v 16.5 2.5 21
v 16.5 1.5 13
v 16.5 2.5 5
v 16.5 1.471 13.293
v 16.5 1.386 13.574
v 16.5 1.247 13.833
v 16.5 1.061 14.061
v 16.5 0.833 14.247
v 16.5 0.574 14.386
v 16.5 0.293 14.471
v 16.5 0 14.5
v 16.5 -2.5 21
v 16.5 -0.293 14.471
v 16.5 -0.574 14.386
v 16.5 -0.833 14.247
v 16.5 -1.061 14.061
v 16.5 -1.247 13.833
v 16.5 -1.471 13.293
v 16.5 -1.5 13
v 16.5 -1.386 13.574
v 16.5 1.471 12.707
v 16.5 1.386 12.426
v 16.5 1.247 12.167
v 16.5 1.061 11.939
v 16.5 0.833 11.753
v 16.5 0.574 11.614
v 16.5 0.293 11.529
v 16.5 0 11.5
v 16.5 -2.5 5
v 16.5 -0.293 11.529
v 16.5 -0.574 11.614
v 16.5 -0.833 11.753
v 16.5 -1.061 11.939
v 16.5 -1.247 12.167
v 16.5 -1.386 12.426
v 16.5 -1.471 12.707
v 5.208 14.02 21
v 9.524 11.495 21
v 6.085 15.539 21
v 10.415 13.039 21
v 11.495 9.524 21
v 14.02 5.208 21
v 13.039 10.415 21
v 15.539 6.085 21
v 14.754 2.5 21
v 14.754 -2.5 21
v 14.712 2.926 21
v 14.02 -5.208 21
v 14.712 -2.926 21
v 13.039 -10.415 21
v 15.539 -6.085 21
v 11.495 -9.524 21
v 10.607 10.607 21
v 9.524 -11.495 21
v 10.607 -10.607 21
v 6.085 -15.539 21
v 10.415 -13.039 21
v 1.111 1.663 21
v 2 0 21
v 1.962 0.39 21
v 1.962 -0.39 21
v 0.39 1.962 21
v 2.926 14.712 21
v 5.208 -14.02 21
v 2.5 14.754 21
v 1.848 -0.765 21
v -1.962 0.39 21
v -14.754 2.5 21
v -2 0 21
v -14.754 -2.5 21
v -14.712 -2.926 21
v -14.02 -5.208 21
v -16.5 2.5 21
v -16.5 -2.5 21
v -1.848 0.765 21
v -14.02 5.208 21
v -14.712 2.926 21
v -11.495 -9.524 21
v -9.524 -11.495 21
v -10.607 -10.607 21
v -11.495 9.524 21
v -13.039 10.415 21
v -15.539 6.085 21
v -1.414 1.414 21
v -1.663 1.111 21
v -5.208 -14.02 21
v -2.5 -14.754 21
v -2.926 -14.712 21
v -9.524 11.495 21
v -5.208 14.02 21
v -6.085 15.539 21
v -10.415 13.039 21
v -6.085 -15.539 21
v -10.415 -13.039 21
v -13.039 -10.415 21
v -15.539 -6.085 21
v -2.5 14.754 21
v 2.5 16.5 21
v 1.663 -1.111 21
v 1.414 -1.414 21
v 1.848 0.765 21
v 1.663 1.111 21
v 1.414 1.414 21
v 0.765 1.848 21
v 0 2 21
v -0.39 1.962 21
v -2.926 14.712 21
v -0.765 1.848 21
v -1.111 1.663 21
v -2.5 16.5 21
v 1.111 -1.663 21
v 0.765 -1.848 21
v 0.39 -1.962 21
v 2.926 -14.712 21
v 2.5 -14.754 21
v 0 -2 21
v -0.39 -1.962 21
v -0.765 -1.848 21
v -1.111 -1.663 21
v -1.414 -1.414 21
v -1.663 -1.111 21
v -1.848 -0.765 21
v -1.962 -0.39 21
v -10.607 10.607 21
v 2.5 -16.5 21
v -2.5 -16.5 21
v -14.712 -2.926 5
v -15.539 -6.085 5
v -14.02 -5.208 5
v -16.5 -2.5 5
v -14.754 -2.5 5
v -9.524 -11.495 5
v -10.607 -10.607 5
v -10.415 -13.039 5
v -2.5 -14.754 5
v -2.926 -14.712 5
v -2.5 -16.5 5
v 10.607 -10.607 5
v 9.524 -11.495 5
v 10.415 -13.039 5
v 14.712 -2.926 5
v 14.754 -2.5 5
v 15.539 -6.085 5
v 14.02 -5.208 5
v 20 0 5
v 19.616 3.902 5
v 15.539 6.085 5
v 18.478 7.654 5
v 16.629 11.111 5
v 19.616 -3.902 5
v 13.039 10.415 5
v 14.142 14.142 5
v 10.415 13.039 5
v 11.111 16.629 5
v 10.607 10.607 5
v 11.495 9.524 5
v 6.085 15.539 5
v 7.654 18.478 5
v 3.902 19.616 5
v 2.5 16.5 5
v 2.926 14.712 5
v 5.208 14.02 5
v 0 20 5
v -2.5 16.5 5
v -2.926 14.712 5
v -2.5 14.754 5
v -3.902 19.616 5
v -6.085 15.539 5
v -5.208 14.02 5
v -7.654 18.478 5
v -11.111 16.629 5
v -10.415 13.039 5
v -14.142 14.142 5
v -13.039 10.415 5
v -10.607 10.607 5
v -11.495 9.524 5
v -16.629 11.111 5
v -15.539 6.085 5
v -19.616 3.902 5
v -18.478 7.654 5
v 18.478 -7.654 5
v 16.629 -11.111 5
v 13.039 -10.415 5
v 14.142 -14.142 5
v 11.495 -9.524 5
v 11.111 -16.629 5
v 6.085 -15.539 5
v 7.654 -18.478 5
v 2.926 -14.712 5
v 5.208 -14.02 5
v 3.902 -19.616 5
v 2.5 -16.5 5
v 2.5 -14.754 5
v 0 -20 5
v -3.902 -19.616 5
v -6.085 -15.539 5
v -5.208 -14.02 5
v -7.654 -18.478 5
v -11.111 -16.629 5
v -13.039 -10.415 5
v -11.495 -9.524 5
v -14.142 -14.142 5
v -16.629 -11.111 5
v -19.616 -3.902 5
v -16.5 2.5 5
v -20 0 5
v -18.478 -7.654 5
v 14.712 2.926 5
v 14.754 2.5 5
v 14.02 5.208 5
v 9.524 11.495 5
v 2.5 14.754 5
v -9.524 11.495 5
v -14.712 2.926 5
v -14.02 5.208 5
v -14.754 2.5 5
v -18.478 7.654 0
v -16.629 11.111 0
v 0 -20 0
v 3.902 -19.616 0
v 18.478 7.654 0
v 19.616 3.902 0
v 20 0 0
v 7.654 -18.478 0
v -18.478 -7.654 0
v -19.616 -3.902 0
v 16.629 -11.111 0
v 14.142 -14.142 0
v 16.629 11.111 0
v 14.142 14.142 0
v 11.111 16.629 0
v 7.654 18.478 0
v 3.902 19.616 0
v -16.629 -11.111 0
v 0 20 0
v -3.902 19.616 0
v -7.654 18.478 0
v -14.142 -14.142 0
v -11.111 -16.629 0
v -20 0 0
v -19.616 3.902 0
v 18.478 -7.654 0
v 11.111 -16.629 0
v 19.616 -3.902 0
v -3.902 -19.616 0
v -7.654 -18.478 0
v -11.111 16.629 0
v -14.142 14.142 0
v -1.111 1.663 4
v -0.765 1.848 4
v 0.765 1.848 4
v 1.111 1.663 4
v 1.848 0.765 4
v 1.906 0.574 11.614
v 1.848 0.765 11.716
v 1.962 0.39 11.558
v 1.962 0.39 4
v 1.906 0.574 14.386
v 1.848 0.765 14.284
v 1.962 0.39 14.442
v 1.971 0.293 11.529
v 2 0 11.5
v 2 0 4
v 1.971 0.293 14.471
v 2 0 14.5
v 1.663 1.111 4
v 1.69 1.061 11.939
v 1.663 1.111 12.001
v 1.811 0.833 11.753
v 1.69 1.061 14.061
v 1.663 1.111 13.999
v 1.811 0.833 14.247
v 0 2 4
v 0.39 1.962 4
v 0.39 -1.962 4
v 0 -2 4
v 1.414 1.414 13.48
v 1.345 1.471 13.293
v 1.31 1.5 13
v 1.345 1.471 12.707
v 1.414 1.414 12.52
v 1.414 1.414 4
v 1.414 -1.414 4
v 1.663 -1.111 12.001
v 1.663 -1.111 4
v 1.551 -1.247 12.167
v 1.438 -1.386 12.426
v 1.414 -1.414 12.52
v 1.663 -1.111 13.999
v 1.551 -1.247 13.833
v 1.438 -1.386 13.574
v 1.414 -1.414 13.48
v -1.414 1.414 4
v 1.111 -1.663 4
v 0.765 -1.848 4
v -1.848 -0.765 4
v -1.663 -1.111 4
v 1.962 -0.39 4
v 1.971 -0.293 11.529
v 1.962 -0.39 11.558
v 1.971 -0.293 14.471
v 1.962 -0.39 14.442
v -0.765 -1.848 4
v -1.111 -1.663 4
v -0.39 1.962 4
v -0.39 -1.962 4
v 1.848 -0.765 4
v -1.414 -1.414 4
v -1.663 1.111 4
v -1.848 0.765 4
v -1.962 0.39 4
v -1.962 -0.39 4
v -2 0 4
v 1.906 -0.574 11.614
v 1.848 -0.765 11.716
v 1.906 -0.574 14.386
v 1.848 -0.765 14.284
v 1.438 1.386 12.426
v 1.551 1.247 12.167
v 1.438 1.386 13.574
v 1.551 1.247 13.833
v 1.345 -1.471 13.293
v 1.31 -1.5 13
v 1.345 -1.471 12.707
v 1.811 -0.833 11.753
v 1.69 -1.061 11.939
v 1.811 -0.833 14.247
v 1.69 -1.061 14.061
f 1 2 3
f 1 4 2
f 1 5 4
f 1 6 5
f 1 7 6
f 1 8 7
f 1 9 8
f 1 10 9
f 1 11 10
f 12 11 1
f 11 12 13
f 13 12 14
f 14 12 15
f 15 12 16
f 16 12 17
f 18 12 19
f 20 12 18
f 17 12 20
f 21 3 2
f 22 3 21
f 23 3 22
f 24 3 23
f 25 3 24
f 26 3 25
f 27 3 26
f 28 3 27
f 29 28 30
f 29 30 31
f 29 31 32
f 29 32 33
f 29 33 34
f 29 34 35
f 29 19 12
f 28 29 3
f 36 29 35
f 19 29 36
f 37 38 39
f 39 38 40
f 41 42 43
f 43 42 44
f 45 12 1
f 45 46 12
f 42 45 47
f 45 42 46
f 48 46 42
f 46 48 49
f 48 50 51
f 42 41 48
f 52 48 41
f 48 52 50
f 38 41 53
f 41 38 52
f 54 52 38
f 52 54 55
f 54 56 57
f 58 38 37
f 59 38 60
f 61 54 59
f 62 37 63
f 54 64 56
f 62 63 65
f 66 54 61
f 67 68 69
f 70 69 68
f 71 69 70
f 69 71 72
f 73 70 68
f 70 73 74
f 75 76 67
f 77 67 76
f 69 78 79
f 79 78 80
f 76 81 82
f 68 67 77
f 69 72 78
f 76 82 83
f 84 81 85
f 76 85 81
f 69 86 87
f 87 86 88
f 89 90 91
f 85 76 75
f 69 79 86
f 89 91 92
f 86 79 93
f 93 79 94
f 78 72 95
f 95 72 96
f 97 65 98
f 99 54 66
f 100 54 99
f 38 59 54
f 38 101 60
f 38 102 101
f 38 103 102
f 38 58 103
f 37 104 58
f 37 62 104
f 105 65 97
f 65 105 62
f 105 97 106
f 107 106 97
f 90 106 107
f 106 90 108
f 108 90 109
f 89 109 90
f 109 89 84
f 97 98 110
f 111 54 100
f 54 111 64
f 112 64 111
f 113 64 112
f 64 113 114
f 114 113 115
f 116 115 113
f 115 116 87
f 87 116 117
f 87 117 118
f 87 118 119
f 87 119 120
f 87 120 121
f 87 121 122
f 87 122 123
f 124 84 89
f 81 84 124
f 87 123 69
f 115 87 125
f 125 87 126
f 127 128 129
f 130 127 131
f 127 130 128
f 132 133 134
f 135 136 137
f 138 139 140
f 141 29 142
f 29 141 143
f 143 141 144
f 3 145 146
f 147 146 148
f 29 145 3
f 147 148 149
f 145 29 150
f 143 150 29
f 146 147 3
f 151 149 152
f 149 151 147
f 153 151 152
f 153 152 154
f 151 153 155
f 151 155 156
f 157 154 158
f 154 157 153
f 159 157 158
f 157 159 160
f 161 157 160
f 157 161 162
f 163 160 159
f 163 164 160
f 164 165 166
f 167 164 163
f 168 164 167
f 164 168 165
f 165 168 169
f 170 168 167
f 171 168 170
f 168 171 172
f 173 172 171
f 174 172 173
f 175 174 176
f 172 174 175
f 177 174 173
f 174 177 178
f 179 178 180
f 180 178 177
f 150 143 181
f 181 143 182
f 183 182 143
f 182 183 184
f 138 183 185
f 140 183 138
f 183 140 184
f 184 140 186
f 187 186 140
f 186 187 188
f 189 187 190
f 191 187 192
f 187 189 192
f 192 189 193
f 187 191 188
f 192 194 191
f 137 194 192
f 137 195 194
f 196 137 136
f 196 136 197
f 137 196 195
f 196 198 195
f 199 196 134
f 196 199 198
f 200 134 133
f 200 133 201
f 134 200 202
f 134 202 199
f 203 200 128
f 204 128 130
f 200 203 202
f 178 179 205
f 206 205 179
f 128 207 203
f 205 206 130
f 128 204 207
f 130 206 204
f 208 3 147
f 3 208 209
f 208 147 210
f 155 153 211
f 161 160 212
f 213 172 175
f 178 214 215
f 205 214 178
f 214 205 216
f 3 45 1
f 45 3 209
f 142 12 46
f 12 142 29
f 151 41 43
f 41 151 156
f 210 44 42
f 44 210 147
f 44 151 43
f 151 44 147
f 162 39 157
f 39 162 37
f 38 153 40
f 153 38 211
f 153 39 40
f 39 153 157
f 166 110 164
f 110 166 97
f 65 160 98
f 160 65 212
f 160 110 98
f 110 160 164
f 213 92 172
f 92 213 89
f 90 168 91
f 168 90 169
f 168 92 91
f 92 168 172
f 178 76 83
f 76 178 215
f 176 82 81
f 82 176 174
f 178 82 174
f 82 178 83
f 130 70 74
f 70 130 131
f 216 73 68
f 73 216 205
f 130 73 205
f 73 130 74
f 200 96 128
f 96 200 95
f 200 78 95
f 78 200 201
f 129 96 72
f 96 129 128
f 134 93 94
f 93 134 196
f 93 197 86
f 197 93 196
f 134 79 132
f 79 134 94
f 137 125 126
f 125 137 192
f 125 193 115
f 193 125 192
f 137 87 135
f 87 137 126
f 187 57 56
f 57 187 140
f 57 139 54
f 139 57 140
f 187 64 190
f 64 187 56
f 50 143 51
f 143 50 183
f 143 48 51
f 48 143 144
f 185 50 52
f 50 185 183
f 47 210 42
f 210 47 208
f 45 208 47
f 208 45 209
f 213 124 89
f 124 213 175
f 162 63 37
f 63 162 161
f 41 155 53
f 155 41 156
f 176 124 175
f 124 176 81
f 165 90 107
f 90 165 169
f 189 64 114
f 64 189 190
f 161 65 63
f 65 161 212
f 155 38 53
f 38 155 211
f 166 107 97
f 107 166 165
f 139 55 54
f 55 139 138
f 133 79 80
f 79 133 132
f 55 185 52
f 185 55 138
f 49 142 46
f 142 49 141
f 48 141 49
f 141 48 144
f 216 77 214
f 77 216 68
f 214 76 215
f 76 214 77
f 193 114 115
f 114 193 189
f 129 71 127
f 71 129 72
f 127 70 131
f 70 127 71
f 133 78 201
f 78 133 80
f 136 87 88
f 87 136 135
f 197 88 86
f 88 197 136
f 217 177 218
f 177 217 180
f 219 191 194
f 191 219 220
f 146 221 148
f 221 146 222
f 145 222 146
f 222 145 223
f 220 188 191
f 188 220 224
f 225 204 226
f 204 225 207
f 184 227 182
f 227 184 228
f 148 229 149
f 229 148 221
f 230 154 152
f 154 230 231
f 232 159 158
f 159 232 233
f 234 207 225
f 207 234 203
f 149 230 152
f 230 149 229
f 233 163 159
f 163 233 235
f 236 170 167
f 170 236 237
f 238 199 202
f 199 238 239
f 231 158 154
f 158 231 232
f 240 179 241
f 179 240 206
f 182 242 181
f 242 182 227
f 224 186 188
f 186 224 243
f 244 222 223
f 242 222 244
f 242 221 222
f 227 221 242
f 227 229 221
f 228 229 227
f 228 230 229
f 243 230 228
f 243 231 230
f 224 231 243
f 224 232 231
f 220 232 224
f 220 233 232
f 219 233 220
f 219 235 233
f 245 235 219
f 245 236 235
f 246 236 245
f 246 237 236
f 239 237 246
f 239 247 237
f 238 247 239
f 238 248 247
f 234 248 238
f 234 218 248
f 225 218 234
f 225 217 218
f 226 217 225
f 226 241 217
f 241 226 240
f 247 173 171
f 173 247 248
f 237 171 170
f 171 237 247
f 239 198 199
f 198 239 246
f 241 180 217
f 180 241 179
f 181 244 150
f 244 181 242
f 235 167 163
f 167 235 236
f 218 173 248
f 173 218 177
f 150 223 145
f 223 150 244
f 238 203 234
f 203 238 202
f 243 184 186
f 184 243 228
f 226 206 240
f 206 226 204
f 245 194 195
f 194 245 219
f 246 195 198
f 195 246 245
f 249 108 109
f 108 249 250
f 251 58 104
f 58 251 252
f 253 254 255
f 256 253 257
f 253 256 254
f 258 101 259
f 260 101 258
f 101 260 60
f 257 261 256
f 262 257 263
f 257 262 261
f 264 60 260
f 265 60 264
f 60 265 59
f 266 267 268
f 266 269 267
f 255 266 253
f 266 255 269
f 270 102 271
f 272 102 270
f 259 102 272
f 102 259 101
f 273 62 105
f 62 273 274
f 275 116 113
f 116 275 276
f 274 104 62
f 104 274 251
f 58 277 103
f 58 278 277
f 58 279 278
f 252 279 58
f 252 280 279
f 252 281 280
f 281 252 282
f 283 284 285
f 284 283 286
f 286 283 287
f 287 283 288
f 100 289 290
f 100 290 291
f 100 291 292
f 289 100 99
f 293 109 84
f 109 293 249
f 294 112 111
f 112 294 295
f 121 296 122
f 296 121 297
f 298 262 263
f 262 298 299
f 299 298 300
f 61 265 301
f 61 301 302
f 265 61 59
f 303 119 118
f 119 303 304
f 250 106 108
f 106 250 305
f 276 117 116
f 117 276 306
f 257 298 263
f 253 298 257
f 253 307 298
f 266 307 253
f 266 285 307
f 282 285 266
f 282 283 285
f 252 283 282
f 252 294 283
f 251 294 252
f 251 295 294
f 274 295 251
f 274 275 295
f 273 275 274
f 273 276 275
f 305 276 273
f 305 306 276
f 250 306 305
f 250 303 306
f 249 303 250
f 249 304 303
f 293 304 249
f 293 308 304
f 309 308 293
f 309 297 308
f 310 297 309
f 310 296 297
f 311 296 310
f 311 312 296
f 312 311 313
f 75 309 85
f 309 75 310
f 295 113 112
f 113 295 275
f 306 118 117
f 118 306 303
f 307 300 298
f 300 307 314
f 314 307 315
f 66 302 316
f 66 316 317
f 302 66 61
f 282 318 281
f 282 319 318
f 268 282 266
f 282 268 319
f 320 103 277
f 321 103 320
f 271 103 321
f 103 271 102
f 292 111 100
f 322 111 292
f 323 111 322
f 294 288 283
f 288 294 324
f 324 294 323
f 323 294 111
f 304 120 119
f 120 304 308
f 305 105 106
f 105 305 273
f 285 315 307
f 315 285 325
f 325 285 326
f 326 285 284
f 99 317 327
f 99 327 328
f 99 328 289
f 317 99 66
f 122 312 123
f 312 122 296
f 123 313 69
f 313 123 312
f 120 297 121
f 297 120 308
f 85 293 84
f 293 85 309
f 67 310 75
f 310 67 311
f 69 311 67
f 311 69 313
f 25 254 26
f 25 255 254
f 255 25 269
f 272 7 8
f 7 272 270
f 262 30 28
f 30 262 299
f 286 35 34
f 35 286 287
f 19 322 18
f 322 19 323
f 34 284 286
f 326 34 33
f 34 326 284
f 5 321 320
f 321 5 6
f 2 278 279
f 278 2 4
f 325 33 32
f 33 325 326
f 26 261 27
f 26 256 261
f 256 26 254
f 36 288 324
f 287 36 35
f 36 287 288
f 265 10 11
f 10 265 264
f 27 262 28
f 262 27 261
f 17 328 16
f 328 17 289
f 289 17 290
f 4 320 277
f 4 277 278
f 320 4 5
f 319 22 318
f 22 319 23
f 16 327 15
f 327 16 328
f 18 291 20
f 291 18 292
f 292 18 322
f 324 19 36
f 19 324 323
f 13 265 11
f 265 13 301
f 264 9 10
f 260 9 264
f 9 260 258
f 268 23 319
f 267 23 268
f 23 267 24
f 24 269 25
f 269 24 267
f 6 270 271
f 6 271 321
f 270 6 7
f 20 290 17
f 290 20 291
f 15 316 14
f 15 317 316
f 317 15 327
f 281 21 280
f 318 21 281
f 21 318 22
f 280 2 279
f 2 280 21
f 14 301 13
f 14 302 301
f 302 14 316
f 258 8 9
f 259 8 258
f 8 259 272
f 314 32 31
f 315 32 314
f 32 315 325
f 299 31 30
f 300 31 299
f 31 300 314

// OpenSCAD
$fn = 32;

// ----------------------------------------------------------------------
// Control knob: skirt knob with grip ribs
// ----------------------------------------------------------------------

// --- parameters (mm) ---
skirt_d = 40;             // skirt diameter
skirt_t = 5;              // skirt thickness
rib_w = 5;                // grip rib width
rib_out = 2.5;            // grip rib radial protrusion
n_ribs = 12;              // number of grip ribs
knob_d = 30;              // knob body diameter
knob_h = 16;              // knob body height
bore_d = 4;               // shaft bore diameter
set_d = 3;                // set screw bore diameter

rib_step = 360 / n_ribs;  // rib angular step
total_h = skirt_t + knob_h;  // overall height

difference() {
  union() {
    translate([0, 0, skirt_t]) cylinder(h = knob_h, d = knob_d);
    cylinder(h = skirt_t, d = skirt_d);
    for (i = [0 : n_ribs - 1])
      rotate([0, 0, i * rib_step])
        translate([knob_d / 2 - 1, -rib_w / 2, skirt_t])
          cube([rib_out, rib_w, knob_h]);
  }
  translate([0, 0, skirt_t - 1]) cylinder(h = knob_h + 2, d = bore_d);
  translate([-1, 0, skirt_t + knob_h / 2]) rotate([0, 90, 0])
    cylinder(h = knob_d / 2 + bore_d / 2 + 2, d = set_d);
}
